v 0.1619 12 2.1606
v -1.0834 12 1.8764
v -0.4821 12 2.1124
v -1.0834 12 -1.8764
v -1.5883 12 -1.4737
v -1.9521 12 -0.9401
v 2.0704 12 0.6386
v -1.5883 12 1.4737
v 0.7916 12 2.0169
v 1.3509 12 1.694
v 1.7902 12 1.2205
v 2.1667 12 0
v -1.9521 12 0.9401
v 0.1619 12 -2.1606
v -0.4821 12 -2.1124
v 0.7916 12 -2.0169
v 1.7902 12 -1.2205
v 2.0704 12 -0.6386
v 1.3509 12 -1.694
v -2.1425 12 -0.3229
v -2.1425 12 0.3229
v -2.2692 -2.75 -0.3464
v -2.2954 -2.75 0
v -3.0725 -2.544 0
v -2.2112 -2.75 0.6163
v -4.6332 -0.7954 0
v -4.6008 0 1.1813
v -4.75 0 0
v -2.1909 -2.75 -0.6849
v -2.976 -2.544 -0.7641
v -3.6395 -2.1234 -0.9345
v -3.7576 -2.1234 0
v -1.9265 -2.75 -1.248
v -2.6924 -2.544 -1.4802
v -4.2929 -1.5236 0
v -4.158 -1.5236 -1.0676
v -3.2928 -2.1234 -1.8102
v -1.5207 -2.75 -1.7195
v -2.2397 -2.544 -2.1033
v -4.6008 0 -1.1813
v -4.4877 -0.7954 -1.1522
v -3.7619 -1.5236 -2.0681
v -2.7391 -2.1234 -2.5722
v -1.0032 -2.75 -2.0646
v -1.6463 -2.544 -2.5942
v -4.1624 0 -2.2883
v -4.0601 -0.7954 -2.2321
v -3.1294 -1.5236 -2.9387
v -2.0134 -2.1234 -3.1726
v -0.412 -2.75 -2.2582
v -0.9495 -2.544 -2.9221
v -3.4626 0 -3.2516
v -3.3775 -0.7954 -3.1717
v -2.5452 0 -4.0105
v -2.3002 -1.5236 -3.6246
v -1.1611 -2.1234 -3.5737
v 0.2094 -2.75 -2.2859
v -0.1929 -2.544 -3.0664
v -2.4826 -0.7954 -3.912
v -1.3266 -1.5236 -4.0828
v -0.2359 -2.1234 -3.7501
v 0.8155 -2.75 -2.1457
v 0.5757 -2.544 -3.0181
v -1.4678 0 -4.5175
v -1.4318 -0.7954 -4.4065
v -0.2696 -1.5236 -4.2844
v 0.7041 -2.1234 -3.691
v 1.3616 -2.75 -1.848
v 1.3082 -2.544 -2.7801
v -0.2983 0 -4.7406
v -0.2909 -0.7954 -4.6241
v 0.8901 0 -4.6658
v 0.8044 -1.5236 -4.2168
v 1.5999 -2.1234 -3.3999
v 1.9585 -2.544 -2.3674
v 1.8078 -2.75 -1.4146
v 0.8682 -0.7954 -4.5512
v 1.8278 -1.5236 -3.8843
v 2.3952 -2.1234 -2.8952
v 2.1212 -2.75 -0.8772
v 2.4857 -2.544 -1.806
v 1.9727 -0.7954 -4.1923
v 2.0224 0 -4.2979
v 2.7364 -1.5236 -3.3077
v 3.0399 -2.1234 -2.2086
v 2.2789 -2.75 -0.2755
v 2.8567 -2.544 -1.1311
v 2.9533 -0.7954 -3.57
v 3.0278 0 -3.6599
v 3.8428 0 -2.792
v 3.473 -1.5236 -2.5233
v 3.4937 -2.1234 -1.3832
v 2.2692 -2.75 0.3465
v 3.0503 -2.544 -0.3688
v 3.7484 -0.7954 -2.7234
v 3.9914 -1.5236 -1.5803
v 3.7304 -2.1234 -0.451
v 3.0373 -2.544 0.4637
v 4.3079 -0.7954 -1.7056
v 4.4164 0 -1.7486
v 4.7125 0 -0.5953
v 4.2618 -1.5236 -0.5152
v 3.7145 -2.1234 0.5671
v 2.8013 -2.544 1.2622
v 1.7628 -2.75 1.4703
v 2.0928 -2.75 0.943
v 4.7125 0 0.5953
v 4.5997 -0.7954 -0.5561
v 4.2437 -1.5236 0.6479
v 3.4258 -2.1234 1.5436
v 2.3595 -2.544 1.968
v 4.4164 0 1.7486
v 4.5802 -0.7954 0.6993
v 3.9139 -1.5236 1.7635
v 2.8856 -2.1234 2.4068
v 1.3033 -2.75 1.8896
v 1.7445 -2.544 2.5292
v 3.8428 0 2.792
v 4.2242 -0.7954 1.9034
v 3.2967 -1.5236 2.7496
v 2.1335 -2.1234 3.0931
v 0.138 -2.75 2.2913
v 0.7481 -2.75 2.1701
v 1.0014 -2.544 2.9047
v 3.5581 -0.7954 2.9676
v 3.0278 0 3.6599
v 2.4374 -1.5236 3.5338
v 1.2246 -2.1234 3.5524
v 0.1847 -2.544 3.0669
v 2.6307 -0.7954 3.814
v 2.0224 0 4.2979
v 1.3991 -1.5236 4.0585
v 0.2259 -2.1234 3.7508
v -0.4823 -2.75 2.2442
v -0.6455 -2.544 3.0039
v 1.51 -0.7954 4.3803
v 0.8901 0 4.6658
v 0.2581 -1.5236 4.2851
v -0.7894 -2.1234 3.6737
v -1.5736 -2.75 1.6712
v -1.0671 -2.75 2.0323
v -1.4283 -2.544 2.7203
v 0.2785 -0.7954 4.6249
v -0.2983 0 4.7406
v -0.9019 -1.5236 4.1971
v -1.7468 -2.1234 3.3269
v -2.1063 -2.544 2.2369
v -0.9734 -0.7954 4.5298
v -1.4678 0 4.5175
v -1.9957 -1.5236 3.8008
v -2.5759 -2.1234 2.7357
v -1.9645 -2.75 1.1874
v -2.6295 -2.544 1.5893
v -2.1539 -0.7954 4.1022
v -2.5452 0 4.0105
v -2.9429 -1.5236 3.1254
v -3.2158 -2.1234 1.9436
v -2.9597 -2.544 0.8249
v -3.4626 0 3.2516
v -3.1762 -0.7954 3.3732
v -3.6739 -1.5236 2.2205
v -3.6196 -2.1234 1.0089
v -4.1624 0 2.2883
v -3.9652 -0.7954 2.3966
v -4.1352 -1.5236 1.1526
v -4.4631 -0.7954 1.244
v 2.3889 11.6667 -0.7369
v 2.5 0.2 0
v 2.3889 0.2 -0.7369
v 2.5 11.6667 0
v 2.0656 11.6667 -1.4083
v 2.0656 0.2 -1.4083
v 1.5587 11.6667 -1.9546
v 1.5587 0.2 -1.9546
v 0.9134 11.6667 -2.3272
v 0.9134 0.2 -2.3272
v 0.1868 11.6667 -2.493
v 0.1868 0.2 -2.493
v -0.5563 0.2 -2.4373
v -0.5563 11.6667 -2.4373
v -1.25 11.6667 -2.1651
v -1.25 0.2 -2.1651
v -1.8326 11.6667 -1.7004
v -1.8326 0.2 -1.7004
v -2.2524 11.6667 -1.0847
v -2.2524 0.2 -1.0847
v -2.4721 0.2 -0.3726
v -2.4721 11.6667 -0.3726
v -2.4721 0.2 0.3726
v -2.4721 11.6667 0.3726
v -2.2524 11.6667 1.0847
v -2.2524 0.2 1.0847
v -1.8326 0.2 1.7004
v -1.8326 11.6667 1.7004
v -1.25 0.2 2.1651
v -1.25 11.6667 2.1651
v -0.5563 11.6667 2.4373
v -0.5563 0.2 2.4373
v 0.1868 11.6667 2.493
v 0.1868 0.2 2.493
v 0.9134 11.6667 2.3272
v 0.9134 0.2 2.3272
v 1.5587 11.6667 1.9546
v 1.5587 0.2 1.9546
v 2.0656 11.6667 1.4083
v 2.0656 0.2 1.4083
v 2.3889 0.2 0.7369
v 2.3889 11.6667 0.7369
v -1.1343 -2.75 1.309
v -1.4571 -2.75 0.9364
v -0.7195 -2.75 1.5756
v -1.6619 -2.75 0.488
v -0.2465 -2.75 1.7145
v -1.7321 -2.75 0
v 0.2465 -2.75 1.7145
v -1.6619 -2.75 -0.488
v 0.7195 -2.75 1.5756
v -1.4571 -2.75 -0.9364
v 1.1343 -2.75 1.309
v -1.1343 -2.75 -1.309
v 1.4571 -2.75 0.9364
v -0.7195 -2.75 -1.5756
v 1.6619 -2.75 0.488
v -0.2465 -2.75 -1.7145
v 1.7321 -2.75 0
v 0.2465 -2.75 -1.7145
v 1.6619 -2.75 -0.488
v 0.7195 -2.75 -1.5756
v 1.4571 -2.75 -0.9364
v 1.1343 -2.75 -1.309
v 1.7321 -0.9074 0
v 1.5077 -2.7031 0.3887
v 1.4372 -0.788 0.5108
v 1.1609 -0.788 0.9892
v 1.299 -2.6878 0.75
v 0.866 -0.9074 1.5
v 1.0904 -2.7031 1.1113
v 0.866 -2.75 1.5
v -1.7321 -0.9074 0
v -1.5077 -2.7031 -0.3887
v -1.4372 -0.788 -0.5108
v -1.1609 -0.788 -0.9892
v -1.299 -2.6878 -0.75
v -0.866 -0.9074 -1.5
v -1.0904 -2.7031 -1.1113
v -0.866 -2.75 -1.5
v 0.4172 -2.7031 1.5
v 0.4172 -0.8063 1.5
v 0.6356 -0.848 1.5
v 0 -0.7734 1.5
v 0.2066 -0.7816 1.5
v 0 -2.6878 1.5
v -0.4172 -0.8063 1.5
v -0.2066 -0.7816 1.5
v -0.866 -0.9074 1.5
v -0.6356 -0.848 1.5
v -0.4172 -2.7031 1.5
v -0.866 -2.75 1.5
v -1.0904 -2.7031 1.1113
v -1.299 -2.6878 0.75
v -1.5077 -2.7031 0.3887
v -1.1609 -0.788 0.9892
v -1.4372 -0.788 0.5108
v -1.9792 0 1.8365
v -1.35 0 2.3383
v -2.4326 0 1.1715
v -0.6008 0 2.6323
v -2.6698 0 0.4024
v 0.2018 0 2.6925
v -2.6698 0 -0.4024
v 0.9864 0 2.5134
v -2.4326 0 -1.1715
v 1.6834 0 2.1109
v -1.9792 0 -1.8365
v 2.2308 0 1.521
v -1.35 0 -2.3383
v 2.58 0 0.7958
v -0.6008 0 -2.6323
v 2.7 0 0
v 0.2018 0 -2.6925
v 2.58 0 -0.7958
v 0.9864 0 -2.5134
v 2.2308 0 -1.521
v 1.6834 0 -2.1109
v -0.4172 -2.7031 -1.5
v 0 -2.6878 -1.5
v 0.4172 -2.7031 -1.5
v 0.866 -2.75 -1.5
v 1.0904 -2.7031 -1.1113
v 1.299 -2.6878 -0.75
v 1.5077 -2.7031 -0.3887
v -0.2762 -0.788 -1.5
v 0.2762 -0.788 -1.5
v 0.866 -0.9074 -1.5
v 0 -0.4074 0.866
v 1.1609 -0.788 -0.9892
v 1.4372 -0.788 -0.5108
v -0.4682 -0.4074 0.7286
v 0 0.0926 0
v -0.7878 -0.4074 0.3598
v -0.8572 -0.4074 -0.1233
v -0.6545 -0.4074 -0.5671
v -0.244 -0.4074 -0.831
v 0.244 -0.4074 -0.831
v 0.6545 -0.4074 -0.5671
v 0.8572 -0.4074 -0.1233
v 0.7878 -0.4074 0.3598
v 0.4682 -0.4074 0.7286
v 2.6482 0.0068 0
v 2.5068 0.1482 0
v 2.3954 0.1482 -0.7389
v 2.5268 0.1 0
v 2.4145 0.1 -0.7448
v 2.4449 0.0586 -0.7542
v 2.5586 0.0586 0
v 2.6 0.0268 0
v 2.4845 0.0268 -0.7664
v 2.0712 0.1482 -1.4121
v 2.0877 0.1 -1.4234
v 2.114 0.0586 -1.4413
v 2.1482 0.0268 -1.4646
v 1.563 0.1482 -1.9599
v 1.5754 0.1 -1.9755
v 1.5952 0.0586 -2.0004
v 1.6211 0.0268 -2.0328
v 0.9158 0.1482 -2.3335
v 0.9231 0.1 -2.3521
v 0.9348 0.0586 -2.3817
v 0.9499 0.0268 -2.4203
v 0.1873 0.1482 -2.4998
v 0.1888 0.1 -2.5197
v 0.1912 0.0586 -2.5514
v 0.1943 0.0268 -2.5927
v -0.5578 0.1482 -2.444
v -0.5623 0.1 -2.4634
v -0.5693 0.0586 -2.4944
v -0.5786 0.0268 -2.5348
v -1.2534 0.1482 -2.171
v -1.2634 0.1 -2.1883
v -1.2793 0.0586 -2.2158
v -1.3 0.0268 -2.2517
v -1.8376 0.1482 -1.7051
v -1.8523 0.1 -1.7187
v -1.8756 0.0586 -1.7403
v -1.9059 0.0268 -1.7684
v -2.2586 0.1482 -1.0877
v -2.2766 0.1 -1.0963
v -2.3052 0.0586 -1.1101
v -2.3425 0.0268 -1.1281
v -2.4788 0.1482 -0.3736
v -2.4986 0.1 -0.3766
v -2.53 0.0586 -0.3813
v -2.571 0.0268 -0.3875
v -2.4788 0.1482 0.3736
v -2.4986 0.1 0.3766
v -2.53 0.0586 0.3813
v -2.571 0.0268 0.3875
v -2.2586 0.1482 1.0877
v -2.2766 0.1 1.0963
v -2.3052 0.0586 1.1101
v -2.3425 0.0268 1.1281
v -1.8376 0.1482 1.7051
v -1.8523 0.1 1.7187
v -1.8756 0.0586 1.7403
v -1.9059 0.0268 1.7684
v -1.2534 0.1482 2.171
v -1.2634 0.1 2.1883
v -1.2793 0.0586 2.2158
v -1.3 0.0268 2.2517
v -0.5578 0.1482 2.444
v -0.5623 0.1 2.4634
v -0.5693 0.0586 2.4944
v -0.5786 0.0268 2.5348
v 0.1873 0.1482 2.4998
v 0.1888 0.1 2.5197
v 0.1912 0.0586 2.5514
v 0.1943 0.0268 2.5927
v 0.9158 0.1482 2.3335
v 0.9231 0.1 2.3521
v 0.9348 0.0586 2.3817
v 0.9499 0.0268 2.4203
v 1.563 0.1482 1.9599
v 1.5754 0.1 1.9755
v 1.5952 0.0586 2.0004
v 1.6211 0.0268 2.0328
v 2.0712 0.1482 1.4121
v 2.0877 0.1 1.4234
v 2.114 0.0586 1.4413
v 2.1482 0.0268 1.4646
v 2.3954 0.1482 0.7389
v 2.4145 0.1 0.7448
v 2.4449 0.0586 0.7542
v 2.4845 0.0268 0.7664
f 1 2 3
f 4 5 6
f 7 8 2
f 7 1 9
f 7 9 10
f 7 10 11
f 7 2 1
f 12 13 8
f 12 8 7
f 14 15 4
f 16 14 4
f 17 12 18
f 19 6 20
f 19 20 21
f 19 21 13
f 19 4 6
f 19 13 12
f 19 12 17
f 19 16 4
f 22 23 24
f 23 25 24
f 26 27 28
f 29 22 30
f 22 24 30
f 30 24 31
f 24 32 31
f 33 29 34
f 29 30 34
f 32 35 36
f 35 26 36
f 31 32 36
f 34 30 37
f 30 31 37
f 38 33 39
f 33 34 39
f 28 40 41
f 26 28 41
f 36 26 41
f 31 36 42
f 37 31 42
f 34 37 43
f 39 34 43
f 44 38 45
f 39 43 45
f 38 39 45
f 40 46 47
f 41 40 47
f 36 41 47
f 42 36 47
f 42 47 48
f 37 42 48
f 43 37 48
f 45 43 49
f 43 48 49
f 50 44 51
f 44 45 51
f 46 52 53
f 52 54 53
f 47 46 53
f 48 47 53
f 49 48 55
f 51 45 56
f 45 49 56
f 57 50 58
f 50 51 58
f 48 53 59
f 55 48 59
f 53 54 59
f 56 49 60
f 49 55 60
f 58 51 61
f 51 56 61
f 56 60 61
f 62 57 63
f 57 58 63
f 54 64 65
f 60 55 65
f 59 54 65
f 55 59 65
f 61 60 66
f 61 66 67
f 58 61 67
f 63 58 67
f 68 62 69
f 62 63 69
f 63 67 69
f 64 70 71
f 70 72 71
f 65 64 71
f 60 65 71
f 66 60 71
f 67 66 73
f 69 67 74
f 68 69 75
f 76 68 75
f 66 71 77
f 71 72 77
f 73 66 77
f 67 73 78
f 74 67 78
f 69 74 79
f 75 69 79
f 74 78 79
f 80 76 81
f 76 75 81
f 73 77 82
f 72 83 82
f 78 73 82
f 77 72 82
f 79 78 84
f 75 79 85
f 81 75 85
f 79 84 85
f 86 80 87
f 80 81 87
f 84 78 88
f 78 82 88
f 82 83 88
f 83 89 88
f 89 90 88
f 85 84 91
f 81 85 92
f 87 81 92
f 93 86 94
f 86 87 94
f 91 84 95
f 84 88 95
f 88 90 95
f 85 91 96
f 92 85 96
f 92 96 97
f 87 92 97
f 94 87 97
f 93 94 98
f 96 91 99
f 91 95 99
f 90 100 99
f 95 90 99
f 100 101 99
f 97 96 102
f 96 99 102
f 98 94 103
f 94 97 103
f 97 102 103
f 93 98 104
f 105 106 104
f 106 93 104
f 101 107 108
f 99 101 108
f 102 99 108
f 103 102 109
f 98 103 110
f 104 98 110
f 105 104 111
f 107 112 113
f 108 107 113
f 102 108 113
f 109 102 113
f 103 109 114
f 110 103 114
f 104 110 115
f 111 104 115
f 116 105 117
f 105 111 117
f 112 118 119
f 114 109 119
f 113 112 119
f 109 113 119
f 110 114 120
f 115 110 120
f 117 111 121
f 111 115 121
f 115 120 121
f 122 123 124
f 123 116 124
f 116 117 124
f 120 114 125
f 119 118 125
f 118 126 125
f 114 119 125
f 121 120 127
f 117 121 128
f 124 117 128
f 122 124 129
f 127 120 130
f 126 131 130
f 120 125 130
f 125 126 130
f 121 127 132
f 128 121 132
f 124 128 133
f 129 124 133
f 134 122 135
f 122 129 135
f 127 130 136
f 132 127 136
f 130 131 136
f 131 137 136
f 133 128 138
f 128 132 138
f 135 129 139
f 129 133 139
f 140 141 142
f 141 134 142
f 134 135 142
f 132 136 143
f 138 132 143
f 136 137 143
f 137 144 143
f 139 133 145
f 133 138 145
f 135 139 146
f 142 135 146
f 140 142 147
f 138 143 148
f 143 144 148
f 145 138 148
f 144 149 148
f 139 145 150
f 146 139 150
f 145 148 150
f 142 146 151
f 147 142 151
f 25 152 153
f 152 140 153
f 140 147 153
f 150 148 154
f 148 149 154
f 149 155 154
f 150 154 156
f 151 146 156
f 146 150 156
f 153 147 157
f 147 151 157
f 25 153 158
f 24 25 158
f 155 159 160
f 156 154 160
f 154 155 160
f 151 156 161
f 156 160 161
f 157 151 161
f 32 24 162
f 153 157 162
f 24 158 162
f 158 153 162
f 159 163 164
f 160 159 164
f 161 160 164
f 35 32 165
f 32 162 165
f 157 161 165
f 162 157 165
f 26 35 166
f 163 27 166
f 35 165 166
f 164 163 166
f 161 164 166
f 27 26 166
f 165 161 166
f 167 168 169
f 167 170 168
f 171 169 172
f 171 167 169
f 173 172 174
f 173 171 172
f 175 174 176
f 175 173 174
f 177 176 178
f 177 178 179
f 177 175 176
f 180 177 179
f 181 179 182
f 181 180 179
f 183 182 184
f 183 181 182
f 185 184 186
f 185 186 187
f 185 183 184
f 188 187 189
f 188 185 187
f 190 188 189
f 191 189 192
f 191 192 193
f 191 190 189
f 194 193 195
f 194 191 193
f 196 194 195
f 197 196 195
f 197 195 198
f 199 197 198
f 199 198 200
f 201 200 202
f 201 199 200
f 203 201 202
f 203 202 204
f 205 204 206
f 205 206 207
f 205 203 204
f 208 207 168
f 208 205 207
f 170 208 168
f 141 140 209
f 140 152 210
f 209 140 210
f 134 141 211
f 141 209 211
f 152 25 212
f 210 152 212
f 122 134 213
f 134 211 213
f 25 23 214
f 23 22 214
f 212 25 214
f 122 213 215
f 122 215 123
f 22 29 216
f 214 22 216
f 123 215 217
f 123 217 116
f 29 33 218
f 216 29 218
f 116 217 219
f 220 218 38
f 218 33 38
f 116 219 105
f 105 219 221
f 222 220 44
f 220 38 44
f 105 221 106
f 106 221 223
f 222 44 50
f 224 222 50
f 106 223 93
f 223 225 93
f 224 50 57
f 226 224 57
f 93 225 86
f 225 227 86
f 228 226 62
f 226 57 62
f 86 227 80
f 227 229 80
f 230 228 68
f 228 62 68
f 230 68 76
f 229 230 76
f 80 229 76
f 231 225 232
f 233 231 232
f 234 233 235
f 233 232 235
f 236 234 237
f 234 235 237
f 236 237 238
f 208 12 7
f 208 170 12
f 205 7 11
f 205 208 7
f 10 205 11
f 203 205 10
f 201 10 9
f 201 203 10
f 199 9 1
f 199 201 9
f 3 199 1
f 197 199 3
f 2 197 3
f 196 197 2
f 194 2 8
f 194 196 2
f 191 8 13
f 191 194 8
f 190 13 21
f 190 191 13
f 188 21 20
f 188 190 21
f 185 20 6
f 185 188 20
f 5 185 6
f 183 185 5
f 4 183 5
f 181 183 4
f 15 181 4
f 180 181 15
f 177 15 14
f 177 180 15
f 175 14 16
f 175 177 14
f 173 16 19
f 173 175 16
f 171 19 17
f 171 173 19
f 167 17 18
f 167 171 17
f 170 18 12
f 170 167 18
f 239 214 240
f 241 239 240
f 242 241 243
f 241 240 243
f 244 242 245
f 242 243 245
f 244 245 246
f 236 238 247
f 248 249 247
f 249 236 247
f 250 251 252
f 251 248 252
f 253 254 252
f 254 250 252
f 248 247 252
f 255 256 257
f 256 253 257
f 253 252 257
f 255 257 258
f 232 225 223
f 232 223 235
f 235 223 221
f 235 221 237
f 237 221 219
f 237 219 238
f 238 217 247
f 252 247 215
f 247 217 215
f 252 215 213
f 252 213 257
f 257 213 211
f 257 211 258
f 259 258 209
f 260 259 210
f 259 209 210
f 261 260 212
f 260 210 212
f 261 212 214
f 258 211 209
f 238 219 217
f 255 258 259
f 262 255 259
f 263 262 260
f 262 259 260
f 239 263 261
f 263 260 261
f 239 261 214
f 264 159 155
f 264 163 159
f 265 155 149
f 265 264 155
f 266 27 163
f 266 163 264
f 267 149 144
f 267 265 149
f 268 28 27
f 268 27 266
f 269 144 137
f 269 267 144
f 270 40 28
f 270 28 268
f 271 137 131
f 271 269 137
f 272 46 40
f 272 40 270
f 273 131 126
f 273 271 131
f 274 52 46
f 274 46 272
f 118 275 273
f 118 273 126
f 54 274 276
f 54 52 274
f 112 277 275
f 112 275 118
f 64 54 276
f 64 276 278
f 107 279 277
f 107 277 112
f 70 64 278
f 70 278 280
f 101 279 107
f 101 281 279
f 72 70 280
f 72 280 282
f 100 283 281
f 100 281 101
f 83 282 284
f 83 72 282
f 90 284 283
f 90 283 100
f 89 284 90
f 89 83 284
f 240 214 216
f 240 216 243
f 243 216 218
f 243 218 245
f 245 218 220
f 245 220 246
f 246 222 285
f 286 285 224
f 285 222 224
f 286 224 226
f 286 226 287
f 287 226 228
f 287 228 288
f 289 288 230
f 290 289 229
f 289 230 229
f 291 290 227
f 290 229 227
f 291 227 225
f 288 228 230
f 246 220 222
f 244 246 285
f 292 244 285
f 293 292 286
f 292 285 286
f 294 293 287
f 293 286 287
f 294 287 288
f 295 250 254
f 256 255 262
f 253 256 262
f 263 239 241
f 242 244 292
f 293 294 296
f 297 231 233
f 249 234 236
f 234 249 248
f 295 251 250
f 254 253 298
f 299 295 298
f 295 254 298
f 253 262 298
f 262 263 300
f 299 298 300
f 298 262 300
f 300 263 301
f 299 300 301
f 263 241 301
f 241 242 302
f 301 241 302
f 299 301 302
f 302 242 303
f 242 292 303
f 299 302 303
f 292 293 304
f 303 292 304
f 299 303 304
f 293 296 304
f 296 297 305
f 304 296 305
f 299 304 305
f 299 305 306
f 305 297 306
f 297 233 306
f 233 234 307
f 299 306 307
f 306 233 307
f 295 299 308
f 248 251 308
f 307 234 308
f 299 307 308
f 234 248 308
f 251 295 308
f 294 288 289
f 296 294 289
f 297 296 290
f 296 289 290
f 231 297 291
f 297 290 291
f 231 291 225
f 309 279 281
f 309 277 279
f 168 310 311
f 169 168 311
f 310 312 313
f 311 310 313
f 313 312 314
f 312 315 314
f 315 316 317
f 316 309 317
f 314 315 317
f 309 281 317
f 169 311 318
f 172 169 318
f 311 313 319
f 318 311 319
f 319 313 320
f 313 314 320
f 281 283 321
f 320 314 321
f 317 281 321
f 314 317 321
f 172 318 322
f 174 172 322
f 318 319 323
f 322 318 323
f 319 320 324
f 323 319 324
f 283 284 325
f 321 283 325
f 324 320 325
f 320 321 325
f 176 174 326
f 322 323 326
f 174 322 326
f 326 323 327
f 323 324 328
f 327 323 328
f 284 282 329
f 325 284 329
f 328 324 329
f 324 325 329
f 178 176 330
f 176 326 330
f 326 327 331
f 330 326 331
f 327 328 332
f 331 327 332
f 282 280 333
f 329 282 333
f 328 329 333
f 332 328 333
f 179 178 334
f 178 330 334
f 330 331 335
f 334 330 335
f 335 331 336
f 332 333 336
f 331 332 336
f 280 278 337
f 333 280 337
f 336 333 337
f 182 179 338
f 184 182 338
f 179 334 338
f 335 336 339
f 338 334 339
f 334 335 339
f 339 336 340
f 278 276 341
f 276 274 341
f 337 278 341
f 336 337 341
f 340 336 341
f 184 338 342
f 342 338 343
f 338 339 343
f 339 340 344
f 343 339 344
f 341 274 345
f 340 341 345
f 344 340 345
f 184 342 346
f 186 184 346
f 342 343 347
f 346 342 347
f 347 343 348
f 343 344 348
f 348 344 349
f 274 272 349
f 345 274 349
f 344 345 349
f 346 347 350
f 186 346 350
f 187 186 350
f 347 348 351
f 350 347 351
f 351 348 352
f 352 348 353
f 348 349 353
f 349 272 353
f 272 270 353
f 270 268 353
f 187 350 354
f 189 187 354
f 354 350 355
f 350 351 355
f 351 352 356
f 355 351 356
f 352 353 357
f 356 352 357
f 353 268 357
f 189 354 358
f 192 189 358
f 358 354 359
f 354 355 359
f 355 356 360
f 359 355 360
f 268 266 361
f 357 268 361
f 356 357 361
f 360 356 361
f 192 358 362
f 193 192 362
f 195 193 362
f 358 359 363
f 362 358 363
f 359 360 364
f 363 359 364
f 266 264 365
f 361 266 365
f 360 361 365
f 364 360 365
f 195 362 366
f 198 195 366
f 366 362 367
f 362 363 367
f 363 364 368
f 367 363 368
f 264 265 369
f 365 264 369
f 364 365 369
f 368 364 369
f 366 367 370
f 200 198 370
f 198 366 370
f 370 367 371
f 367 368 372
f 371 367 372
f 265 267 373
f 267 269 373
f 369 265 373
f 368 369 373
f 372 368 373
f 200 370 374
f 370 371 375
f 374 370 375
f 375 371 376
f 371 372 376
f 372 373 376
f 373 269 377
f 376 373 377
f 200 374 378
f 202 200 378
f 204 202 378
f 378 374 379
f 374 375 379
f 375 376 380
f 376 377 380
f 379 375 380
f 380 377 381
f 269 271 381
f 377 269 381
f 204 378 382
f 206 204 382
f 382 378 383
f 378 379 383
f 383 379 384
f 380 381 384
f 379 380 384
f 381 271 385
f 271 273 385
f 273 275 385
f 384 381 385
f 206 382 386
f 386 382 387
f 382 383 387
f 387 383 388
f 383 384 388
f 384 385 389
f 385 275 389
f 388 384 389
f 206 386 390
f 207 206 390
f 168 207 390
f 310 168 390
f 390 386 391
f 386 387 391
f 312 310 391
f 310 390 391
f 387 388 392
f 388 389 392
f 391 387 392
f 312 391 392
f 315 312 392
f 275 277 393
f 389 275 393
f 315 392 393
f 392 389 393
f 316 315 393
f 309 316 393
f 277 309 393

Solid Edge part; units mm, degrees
sketch "Sketch1" plane through (0, 0, 0) normal (0, 0, 1) x (1, 0, 0)
  line L0 (2.5, 0) -> (2.5, 12)
  line L1 (0, 12) -> (2.5, 12)
  line L2 (0, 0) -> (0, 12)
  line L3 (0, 0) -> (0, -2.75)
  line L4 (0, -2.75) -> (4.75, -2.75)
  line L5 (4.75, -2.75) -> (4.75, 0)
  line L6 (4.75, 0) -> (2.5, 0)
revolve "RevolvedProtrusion1" add sketch "Sketch1" angle 360 about axis through (0, 0, 0) along (0, 1, 0)
sketch "Sketch2" plane through (0, 0, 0) normal (1, 0, 0) x (0, 1, 0)
  line L0 (-2.75, 2.2215) -> (-1.19, 2.2215)
  line L1 (0.0926, 0) -> (-1.19, 2.2215)
  line L2 (-2.75, 0) -> (0.0926, 0)
  line L3 (-2.75, 0) -> (-2.75, 2.2215)
revolve "RevolvedCutout1" cut sketch "Sketch2" angle 360 about axis through (0, -4.5, 0) along (0, 1, 0)
sketch "Sketch3" plane through (0, -2.75, 0) normal (0, -1, 0) x (0, 0, 1)
  circle A0 centre (0, 0) radius 2.2215
  line L0 (-1.5, -0.866) -> (0, -1.7321)
  line L1 (0, -1.7321) -> (1.5, -0.866)
  line L2 (1.5, -0.866) -> (1.5, 0.866)
  line L3 (1.5, 0.866) -> (0, 1.7321)
  line L4 (0, 1.7321) -> (-1.5, 0.866)
  line L5 (-1.5, 0.866) -> (-1.5, -0.866)
  dimension "D1" = 3
extrude "Protrusion1" add sketch "Sketch3" against normal up to next
sketch "Sketch4" plane through (0, 0, 0) normal (0, 0, 1) x (1, 0, 0)
  line L0 (-1.7321, -2.75) -> (0, -2.75)
  line L1 (0, -2.75) -> (0, -2.2859)
  line L2 (0, -2.2859) -> (-1.7321, -2.75)
revolve "RevolvedCutout2" cut sketch "Sketch4" angle 360 about axis through (0, -4.5, 0) along (0, 1, 0)
fillet "Round1" radius 0.2 1 edges at (0, 0, -2.5)
chamfer "倒斜角_2" distance 0.3333 angle 45 1 edges at (0, 12, -2.5)
cosmetic_thread "螺纹_3" size "M5" thread depth 10.4
sketch "Sketch5" plane through (0, 0, 0) normal (0, 0, 1) x (1, 0, 0)
  arc A0 (-2.2953, -2.75) -> (-4.75, 0) centre (-1.9822, 0) cw
revolve "RevolvedCutout3" cut sketch "Sketch5" angle 360 about axis through (0, 0, 0) along (0, -1, 0) material side at (-4.0844, -1.8764, 0)
